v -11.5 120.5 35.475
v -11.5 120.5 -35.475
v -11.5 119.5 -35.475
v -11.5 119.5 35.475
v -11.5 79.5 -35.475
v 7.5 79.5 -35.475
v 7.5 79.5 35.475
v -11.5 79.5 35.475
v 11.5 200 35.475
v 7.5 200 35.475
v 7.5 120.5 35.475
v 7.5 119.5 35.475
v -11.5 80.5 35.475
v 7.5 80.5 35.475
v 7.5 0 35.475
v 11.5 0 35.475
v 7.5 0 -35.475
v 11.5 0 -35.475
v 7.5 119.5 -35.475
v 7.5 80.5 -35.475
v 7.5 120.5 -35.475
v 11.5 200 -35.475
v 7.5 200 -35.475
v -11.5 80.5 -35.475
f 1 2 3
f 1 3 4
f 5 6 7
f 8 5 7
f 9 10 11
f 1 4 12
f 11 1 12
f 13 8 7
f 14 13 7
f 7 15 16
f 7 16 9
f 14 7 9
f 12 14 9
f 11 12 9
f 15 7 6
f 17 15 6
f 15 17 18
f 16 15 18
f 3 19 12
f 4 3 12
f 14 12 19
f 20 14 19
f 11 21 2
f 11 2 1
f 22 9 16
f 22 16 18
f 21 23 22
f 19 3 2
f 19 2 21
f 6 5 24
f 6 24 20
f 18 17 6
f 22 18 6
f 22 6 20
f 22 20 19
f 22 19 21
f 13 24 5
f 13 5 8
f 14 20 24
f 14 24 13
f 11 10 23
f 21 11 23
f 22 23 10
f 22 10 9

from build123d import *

# Parameters (mm, degrees)
SKETCH1_W           = 23
SKETCH1_H           = 70.95
BOSS_EXTRUDE1_DEPTH = 200
SKETCH2_W           = 19
SKETCH2_H           = 70.95
CUT_EXTRUDE1_DEPTH  = 204.447107684
SKETCH3_W           = 70.95
SKETCH3_H           = 1
BOSS_EXTRUDE2_DEPTH = 19


with BuildPart() as part:
    # Sketch1 → Boss-Extrude1 (new body)
    with BuildSketch(Plane(origin=(0, 0, 0), x_dir=(1, 0, 0), z_dir=(0, 1, 0))):
        Rectangle(SKETCH1_W, SKETCH1_H)
    extrude(amount=BOSS_EXTRUDE1_DEPTH)

    # Sketch2 → Cut-Extrude1 (cut, through all)
    with BuildSketch(Plane(origin=(0, 200, 0), x_dir=(1, 0, 0), z_dir=(0, 1, 0))):
        with Locations((-2, 0)):
            Rectangle(SKETCH2_W, SKETCH2_H)
    extrude(amount=-CUT_EXTRUDE1_DEPTH, mode=Mode.SUBTRACT)

    # Sketch3 → Boss-Extrude2 (add)
    with BuildSketch(Plane.ZY.offset(-7.5)):
        with Locations((0, 80)):
            Rectangle(SKETCH3_W, SKETCH3_H)
        with Locations((0, 120)):
            Rectangle(SKETCH3_W, SKETCH3_H)
    extrude(amount=BOSS_EXTRUDE2_DEPTH)


solid = part.part
